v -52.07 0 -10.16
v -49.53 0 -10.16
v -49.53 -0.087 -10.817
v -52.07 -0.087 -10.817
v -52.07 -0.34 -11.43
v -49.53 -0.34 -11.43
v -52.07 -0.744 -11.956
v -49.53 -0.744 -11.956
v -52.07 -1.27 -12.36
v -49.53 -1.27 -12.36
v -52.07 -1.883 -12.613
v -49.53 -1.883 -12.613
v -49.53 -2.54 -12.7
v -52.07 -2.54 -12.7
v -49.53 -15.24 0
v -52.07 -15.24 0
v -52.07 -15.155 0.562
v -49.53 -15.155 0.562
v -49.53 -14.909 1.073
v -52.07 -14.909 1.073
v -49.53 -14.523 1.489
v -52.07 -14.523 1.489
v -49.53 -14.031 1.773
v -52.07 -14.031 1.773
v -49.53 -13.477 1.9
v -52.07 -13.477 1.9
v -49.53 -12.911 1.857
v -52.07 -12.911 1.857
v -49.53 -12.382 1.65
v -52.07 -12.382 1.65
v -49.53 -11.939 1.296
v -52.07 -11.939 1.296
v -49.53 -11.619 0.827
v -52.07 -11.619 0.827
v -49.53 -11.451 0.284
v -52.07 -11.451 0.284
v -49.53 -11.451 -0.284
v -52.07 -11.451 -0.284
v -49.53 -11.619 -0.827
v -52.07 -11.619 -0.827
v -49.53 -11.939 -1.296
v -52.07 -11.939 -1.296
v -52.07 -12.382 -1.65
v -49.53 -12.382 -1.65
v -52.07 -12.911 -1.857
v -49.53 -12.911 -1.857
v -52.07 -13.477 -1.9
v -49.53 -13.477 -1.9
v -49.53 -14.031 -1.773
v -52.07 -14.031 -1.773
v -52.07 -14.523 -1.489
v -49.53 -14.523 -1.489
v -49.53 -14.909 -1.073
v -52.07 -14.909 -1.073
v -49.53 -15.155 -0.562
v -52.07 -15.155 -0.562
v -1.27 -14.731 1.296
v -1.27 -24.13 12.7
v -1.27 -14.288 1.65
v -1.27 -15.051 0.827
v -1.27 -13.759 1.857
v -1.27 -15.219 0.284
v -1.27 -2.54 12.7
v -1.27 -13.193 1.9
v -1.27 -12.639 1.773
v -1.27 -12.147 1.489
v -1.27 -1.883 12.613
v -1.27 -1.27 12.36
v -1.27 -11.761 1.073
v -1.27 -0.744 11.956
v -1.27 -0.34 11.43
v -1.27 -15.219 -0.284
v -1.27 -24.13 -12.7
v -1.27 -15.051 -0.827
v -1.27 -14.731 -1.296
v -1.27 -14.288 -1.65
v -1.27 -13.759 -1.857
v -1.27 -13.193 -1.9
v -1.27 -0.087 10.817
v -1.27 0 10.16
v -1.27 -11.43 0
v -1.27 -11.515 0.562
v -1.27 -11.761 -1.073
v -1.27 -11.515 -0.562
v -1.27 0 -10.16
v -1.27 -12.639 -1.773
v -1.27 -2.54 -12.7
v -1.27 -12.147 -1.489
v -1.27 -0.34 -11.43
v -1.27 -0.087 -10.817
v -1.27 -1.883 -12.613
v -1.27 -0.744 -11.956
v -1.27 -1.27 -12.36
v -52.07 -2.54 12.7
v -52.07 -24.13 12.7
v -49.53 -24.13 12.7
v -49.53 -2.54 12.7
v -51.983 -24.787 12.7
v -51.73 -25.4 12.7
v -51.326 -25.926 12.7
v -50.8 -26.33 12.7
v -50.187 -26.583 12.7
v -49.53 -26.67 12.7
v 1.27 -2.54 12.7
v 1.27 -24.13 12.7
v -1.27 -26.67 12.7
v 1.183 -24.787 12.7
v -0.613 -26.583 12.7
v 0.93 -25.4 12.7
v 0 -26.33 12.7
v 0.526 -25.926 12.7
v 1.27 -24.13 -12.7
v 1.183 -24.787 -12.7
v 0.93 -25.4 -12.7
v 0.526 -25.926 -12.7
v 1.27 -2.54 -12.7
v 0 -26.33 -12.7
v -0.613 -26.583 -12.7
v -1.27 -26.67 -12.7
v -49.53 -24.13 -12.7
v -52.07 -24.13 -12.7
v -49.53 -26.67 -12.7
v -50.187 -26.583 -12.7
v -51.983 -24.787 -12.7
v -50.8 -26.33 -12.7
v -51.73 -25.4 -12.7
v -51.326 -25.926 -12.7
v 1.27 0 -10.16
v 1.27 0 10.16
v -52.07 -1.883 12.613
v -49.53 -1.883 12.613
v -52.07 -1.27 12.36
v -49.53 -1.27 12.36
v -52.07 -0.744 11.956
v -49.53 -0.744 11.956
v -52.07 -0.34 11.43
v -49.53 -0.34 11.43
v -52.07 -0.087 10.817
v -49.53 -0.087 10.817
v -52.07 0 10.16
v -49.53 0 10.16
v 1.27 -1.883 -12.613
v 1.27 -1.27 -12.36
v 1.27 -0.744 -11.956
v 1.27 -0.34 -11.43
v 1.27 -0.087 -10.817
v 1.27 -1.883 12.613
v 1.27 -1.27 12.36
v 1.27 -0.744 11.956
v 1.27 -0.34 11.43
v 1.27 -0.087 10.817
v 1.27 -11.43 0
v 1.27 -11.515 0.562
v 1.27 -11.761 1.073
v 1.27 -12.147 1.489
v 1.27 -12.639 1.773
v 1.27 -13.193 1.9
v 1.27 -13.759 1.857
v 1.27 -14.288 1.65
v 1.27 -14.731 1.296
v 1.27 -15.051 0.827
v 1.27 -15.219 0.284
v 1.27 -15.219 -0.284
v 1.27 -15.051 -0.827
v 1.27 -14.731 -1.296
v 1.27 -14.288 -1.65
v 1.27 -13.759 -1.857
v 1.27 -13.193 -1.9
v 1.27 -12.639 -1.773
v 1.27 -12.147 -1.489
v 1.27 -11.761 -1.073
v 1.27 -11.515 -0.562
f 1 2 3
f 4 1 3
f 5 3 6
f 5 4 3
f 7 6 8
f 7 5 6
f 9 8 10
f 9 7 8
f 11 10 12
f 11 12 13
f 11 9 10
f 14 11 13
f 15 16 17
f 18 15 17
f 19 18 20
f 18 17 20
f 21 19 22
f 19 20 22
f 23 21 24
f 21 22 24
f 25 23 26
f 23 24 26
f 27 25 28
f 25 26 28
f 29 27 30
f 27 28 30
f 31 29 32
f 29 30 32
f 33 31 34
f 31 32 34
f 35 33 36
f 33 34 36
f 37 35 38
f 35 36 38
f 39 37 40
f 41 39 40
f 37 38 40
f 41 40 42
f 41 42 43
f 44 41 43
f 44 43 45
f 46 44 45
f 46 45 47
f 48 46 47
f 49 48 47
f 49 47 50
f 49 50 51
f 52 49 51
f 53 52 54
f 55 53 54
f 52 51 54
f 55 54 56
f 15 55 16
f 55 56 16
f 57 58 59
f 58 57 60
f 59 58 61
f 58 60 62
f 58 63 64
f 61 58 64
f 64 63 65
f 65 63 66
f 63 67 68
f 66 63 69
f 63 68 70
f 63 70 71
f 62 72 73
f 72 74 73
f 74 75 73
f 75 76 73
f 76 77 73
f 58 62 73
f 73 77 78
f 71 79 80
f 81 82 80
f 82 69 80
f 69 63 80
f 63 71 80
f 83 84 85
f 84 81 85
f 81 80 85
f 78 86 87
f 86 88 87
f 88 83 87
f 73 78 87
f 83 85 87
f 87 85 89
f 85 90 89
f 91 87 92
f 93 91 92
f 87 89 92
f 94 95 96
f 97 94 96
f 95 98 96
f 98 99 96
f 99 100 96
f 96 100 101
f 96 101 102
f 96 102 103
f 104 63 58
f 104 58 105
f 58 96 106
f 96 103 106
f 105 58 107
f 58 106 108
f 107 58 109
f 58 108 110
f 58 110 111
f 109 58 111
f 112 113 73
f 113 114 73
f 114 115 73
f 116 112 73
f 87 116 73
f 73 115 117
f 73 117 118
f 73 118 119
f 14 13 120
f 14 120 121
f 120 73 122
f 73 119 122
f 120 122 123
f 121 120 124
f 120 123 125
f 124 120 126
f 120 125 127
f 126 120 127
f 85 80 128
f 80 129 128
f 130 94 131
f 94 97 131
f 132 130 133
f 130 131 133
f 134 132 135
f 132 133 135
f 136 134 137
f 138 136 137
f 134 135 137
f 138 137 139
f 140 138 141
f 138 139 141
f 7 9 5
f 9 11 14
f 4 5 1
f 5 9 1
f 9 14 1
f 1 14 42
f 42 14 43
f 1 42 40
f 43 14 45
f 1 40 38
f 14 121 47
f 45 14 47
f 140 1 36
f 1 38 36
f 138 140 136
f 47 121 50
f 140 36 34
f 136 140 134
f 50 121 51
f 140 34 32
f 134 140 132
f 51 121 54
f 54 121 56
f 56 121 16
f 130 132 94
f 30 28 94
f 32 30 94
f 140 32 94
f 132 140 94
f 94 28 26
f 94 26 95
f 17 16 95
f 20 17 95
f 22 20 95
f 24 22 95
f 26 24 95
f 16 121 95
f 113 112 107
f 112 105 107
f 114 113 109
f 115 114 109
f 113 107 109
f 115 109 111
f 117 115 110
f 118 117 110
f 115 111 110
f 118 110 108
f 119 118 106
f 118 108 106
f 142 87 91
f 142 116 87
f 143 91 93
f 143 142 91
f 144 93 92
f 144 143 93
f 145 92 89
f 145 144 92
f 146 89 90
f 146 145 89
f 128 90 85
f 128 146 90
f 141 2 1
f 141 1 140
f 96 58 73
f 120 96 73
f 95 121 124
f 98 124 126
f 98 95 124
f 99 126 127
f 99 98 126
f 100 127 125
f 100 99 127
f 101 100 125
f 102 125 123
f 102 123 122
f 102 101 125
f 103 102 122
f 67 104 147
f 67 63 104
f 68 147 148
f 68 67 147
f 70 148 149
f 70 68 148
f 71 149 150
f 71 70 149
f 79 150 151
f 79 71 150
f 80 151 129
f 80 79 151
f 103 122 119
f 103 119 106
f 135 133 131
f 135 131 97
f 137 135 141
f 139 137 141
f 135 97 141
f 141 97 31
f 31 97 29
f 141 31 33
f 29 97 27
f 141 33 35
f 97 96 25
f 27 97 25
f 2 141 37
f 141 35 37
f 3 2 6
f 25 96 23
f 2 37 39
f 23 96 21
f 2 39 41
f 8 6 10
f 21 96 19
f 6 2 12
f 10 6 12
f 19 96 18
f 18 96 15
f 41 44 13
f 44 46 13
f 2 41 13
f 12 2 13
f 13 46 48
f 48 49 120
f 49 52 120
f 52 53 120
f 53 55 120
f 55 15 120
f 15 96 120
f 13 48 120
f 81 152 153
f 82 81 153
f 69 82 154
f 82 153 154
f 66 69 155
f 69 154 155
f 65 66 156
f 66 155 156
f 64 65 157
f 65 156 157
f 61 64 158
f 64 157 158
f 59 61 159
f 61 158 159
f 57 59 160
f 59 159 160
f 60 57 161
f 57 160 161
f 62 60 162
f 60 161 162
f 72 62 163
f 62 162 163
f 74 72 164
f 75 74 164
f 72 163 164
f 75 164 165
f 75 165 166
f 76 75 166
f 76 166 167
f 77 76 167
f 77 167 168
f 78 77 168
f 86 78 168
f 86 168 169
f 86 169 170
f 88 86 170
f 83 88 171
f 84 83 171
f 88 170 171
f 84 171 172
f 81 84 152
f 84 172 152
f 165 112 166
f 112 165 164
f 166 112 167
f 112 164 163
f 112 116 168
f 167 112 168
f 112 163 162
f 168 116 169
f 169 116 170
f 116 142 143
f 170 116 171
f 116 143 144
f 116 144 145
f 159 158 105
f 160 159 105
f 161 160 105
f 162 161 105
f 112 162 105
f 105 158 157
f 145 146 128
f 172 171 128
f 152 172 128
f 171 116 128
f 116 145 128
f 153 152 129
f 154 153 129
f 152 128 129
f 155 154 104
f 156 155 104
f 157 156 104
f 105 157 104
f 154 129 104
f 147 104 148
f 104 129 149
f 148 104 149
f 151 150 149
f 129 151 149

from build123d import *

# Parameters (mm, degrees)
F1_W     = 2.54
F1_H     = 25.4
F3_R     = 1.905
F5_DEPTH = 2.54
F4_R     = 1.905
F6_DEPTH = 2.54
F7_R     = 2.54


with BuildPart() as f2:
    # F2: sweep along a path in F0
    with BuildLine(Plane.XY) as f2_path:
        Line((-50.8, 0), (-50.8, -25.4))
        Line((-50.8, -25.4), (0, -25.4))
        Line((0, -25.4), (0, 0))
    # F1 (on Front) → F2 (sweep)
    with BuildSketch(Plane.XZ):
        Rectangle(F1_W, F1_H)
    sweep(path=f2_path.line, transition=Transition.RIGHT)

    # F3 (on face) → F5 (cut, through all)
    with BuildSketch(Plane.YZ.offset(1.27)):
        with Locations((-13.335, 0)):
            Circle(F3_R)
    extrude(amount=-F5_DEPTH, mode=Mode.SUBTRACT)

    # F4 (on face) → F6 (cut, through all)
    with BuildSketch(Plane(origin=(-52.07, 0, 0), x_dir=(0, -1, 0), z_dir=(-1, 0, 0))):
        with Locations((13.335, 0)):
            Circle(F4_R)
    extrude(amount=-F6_DEPTH, mode=Mode.SUBTRACT)

    # F7
    f7_edges = [f2.edges().sort_by_distance(p)[0] for p in [
        (-50.8, 0, 12.7),
        (-50.8, 0, -12.7),
        (0, 0, -12.7),
        (0, 0, 12.7),
        (1.27, -26.67, 0),
        (-52.07, -26.67, 0),
    ]]
    fillet(f7_edges, radius=F7_R)


solid = f2.part
